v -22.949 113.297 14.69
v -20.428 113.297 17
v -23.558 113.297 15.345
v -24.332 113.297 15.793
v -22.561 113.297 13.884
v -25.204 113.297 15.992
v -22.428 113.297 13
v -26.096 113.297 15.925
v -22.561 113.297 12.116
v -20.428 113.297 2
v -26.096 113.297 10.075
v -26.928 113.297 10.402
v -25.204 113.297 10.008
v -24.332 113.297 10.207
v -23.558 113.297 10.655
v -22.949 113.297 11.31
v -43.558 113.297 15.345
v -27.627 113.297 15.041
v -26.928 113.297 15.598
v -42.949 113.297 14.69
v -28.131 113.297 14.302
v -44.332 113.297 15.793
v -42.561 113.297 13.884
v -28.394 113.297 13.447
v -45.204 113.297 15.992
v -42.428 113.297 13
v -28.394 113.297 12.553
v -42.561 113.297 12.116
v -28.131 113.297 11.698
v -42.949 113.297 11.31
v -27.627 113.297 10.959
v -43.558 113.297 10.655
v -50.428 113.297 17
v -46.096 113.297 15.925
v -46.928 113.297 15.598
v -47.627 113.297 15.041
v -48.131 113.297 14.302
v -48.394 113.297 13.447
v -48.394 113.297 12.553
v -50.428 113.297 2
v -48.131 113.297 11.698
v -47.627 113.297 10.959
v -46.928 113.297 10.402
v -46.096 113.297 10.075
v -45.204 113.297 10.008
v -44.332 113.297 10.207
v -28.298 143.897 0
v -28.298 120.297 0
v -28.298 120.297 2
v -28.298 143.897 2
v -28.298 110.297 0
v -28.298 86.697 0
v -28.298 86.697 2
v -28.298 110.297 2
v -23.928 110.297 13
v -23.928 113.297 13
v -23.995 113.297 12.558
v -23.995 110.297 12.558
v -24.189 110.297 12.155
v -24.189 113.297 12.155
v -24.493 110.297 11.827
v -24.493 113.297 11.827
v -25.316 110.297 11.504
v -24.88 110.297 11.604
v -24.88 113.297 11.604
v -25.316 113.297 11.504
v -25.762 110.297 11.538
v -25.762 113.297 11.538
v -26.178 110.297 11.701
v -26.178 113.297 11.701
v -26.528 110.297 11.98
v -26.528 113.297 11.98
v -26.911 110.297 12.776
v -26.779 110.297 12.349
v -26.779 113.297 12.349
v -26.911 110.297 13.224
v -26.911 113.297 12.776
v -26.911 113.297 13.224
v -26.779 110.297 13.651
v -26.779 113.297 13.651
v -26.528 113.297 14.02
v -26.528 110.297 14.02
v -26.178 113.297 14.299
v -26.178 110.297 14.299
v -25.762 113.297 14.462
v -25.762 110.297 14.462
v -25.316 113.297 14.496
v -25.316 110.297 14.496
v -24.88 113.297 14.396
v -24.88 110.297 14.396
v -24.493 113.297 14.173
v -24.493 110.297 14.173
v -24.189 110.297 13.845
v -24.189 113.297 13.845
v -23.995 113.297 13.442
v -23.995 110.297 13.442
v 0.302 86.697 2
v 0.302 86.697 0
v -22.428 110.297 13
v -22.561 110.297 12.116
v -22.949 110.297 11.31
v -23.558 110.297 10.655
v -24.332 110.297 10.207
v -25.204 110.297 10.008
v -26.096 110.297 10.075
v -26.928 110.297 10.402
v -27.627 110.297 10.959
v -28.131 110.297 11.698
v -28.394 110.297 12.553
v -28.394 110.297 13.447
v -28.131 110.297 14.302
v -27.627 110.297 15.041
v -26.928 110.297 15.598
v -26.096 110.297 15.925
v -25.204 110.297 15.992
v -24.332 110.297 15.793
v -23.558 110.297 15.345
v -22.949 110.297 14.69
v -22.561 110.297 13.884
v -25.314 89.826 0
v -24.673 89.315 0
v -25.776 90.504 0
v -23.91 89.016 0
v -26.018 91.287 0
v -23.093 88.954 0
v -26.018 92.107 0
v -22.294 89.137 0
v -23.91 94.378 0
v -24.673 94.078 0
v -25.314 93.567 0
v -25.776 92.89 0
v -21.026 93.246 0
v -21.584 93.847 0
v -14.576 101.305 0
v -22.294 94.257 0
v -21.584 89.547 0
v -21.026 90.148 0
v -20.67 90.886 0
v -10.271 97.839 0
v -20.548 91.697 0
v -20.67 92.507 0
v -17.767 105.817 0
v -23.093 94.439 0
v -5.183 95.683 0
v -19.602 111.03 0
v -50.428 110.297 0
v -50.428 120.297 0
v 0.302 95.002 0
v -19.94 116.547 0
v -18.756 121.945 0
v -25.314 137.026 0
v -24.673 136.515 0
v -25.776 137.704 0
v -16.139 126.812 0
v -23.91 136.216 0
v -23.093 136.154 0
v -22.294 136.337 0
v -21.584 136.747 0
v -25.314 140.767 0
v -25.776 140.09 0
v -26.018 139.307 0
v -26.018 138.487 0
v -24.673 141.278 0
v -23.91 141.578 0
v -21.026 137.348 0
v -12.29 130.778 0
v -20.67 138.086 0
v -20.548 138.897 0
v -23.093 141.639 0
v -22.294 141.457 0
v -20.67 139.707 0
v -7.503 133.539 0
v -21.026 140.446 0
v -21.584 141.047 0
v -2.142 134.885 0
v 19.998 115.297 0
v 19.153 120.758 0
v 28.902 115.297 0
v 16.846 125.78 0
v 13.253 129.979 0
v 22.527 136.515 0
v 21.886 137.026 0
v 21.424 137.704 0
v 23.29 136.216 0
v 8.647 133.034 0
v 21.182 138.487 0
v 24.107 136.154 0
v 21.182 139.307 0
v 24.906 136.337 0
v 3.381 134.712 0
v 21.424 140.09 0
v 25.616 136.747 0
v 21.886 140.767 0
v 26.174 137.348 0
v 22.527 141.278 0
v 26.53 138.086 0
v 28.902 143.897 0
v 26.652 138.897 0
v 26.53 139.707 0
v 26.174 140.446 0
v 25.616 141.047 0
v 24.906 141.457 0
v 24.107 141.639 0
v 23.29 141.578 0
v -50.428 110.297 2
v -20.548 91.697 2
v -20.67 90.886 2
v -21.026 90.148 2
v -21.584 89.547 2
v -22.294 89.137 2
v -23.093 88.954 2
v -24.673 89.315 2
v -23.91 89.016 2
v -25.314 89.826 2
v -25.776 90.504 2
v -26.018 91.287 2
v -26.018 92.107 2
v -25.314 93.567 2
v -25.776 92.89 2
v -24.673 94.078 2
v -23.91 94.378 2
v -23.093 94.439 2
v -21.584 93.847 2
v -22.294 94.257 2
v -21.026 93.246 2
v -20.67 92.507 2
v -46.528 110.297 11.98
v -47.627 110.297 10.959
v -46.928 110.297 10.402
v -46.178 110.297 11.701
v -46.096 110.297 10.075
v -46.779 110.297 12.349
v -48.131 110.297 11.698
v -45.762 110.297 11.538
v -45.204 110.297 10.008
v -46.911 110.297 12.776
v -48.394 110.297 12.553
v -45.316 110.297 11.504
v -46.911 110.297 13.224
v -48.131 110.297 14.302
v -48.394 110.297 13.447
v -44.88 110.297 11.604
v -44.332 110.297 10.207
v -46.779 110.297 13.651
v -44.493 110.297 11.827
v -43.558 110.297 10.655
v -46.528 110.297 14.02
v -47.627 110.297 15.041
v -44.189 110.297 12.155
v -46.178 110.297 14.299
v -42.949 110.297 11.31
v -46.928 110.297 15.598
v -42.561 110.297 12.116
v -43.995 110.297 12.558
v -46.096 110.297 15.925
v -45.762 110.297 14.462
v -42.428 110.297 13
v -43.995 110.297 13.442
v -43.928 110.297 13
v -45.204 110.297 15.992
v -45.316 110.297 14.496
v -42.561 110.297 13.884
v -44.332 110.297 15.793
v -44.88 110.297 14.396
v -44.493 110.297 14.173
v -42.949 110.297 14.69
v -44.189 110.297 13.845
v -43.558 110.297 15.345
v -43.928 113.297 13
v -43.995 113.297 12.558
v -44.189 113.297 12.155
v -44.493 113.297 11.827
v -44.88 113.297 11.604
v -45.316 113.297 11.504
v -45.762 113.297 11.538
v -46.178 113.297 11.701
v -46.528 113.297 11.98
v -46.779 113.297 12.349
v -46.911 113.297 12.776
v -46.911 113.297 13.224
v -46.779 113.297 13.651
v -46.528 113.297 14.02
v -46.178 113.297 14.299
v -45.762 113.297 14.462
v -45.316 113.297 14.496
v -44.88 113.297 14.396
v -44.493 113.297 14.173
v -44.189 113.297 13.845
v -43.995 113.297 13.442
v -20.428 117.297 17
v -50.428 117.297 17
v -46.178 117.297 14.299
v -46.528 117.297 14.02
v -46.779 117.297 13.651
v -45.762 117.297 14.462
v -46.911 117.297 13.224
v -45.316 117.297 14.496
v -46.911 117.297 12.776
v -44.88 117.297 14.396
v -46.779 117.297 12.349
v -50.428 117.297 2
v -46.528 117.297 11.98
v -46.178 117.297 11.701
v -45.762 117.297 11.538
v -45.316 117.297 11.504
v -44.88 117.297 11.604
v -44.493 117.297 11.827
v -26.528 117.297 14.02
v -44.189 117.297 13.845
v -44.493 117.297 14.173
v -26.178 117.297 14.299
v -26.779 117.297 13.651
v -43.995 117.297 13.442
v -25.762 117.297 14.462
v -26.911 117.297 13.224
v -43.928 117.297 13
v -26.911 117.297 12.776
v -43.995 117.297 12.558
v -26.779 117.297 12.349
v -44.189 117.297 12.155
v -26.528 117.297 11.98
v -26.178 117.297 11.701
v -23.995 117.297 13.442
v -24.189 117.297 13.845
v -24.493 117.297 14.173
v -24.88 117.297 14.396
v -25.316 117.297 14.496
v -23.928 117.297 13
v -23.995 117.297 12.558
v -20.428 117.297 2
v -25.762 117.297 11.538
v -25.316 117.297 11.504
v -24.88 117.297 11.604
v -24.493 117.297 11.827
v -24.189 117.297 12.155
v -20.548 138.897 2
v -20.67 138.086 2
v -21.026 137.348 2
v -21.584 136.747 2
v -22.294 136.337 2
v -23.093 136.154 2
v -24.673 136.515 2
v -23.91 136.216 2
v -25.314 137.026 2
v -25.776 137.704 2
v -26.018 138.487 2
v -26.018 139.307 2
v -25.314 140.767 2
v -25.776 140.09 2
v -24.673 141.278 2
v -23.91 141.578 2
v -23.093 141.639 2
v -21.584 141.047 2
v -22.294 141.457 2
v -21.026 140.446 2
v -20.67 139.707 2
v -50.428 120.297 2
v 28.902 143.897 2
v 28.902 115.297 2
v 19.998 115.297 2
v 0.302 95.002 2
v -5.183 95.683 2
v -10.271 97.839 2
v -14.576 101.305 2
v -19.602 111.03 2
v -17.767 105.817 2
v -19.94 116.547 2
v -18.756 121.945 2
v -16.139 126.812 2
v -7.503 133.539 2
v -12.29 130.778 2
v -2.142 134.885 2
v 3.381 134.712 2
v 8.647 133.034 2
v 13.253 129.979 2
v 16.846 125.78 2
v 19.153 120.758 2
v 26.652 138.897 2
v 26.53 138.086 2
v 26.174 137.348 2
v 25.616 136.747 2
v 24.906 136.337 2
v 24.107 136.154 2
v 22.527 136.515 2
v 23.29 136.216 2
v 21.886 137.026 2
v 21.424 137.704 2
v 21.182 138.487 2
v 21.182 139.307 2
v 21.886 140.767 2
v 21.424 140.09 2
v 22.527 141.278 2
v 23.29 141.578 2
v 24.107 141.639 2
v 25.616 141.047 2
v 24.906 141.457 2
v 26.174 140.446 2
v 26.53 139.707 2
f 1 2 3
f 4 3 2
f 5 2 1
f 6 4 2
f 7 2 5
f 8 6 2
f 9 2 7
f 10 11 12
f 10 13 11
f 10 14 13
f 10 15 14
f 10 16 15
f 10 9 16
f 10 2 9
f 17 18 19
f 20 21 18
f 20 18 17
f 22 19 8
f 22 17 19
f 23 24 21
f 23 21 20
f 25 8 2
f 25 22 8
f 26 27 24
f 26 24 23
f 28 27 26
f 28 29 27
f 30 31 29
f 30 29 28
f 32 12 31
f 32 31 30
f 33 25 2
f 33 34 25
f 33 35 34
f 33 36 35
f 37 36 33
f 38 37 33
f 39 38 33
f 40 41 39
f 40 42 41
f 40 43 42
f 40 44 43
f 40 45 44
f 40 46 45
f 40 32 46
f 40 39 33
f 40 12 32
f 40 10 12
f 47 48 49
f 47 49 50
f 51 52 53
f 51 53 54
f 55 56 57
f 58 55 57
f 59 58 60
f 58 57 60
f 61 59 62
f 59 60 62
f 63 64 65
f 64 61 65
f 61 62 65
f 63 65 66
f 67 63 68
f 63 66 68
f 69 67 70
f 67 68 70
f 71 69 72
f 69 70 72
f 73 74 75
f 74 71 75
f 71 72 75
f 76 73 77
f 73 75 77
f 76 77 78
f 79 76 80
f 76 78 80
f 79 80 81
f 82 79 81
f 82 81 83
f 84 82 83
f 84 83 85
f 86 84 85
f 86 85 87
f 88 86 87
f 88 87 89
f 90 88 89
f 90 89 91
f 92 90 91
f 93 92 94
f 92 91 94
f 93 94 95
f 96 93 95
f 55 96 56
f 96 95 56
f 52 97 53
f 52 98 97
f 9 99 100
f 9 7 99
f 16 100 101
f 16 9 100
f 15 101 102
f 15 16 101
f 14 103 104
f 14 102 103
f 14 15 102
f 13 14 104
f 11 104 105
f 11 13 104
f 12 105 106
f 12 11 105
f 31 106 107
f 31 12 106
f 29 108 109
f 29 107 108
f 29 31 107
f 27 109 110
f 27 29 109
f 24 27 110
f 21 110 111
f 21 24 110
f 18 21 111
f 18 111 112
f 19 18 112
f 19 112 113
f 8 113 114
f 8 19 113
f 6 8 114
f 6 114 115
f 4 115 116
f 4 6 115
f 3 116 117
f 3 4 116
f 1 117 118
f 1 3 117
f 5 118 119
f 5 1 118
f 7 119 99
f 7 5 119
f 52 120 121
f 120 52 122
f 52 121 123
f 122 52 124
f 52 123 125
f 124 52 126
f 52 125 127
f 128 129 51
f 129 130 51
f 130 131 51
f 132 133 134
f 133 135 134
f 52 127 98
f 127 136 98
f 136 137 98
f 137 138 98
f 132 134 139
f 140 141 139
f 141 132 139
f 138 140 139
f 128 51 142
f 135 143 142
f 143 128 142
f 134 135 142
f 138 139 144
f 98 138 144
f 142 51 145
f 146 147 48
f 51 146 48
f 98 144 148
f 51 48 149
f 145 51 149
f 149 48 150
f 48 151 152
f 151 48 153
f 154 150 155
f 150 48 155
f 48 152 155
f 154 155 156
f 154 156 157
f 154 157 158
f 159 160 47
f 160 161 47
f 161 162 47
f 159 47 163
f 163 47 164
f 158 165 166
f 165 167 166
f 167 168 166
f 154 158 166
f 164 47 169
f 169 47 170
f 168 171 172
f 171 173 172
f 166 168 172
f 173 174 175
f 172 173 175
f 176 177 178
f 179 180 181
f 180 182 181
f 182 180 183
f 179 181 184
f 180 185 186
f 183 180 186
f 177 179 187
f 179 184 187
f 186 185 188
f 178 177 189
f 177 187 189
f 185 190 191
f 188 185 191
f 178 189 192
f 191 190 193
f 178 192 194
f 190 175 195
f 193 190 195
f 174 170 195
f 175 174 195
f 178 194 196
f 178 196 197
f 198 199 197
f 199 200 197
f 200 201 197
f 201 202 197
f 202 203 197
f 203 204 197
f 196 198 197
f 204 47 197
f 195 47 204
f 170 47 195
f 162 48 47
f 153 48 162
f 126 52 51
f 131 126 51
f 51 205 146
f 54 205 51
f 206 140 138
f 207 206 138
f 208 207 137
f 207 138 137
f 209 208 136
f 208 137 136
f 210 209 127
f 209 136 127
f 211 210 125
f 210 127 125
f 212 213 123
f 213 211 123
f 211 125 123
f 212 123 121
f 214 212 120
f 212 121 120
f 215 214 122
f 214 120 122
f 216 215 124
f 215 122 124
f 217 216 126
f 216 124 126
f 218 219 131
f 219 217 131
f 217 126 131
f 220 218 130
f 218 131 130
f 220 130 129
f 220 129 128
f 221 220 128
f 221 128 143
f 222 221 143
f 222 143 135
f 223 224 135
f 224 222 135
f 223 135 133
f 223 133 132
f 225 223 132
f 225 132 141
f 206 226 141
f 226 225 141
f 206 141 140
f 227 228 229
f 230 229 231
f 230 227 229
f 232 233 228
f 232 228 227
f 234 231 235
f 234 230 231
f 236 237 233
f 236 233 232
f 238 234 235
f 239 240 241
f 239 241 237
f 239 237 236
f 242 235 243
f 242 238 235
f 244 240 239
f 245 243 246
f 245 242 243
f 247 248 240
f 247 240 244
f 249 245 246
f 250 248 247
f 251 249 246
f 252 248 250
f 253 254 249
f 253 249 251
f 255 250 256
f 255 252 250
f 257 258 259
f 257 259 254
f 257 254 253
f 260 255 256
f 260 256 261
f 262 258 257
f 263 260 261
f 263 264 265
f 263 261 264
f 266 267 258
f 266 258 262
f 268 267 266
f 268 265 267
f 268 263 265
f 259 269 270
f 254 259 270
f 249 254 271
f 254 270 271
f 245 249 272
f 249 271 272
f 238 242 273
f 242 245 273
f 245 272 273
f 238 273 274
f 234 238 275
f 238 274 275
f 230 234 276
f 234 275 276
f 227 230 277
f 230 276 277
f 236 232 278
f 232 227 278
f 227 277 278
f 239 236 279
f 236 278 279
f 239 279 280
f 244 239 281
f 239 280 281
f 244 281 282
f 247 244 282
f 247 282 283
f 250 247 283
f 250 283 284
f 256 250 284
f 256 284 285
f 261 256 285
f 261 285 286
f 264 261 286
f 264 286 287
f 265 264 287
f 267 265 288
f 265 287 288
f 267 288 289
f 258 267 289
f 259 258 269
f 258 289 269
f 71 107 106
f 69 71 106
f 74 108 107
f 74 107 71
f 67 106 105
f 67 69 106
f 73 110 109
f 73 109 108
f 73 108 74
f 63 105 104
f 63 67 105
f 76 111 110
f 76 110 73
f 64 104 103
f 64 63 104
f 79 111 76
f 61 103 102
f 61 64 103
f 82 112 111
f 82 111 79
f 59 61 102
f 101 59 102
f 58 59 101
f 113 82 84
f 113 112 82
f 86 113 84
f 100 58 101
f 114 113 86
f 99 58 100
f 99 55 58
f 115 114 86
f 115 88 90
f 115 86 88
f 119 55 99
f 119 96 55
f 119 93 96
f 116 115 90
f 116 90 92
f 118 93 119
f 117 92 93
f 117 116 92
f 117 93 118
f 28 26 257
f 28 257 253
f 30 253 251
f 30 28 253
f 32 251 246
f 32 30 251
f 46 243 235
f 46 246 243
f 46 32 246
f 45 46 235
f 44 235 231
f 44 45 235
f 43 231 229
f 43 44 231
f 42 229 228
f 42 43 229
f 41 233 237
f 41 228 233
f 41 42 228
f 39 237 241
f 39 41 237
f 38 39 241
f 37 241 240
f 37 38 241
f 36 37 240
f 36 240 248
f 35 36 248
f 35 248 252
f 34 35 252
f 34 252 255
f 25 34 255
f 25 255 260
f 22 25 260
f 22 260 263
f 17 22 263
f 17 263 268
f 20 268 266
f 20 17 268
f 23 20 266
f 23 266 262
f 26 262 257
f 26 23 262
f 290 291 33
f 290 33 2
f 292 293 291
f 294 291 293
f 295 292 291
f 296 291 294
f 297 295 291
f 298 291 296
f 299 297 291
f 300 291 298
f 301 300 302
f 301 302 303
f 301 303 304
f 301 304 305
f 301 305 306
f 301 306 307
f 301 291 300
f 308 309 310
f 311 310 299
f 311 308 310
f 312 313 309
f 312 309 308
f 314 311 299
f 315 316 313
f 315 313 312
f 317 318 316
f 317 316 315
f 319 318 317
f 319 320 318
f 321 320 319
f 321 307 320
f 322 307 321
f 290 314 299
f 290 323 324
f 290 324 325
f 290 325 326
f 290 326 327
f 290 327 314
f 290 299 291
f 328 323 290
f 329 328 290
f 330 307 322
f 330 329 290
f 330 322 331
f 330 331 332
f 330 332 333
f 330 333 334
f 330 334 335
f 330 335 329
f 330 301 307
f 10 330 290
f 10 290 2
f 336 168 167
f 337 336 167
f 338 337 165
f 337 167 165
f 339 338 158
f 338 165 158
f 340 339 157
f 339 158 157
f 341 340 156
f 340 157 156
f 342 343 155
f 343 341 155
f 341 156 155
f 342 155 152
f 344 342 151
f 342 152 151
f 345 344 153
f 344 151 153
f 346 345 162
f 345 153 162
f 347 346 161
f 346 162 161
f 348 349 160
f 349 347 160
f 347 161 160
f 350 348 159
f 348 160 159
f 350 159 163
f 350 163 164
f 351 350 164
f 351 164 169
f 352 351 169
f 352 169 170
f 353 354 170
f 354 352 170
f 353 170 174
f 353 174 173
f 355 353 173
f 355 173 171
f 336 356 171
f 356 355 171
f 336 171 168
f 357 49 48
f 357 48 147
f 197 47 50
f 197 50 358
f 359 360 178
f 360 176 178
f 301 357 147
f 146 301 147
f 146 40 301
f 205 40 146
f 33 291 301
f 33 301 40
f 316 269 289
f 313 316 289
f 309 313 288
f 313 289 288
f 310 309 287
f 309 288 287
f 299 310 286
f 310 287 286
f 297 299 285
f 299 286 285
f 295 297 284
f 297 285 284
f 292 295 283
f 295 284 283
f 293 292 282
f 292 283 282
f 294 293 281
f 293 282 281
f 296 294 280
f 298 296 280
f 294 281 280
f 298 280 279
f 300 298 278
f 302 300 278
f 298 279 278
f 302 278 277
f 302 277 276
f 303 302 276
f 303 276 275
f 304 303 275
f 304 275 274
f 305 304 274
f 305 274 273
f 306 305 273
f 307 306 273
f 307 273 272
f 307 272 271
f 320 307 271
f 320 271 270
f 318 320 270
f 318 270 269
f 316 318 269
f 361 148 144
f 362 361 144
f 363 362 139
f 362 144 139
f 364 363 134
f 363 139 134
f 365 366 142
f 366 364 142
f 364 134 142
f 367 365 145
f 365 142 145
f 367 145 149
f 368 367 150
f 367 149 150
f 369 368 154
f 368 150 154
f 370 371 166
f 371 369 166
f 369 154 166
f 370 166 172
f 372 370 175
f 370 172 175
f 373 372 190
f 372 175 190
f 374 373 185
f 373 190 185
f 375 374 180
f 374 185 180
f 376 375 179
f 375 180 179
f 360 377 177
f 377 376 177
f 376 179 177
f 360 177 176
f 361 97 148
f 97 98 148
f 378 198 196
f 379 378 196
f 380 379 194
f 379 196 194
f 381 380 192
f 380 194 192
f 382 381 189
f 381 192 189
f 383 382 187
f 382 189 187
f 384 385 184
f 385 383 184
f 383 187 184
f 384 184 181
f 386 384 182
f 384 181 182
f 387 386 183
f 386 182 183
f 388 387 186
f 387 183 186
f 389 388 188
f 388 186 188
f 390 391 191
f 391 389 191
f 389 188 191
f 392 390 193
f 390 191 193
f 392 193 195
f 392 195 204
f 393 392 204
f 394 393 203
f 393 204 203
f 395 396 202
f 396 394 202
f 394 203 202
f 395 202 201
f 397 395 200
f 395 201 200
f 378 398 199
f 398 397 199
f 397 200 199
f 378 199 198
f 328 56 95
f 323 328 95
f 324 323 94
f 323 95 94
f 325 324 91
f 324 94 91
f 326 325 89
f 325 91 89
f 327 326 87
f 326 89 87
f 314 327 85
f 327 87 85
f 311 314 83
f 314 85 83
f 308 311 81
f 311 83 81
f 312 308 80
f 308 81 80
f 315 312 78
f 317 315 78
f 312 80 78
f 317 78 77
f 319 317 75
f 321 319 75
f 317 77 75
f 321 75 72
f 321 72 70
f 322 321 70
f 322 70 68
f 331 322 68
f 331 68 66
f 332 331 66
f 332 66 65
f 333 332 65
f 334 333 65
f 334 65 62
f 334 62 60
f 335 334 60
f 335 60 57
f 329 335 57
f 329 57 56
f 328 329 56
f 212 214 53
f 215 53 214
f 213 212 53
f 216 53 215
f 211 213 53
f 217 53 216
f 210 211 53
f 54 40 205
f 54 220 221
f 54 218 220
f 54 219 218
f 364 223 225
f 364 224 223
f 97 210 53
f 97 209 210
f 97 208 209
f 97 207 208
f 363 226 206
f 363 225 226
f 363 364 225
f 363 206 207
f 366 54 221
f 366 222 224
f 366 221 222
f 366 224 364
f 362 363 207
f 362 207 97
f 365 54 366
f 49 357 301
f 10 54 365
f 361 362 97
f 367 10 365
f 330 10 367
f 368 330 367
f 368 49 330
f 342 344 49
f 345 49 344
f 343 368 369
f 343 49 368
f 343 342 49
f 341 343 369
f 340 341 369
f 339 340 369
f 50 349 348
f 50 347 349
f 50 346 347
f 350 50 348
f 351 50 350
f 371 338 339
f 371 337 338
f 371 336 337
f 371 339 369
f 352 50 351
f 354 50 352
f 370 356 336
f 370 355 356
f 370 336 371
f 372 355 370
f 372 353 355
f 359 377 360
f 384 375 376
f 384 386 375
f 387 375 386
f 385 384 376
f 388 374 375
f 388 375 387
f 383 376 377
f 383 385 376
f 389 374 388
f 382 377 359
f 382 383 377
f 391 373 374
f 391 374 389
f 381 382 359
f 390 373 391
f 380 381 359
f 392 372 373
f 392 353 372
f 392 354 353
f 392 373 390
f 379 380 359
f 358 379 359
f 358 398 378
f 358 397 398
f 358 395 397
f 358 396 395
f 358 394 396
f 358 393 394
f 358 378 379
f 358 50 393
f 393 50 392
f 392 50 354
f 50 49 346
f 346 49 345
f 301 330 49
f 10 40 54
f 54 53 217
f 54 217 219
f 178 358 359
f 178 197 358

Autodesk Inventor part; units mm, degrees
ref_plane "YZ Plane" through (0, 0, 0) normal (1, 0, 0) x (0, 1, 0)
ref_plane "XZ Plane" through (0, 0, 0) normal (0, 1, 0) x (-1, 0, 0)
ref_plane "XY Plane" through (0, 0, 0) normal (0, 0, 1) x (1, 0, 0)
sketch "Sketch1" plane through (0, 0, 0) normal (0, 0, 1) x (1, 0, 0)
  line L0 (30.9017, 120.8967) -> (30.9017, 145.8967)
  line L1 (30.9017, 145.8967) -> (-30.2983, 145.8967)
  line L2 (-30.2983, 145.8967) -> (-30.2983, 120.8967)
  line L3 (-30.2983, 120.8967) -> (-33.2983, 120.8967)
  line L4 (-33.2983, 120.8967) -> (-33.2983, 89.6967)
  line L5 (-33.2983, 89.6967) -> (-25.2983, 81.6967)
  line L6 (-25.2983, 81.6967) -> (25.9017, 81.6967)
  line L7 (25.9017, 81.6967) -> (33.9017, 89.6967)
  line L8 (33.9017, 89.6967) -> (33.9017, 120.8967)
  line L9 (33.9017, 120.8967) -> (30.9017, 120.8967)
  circle A0 centre (0, 115) radius 20
  circle A1 centre (-23.2983, 138.8967) radius 2.75
  circle A2 centre (23.9017, 91.6967) radius 2.75
  circle A3 centre (23.9017, 138.8967) radius 2.75
  circle A4 centre (-23.2983, 91.6967) radius 2.75
  line L10 (-30.2983, 145.8967) -> (-30.2983, 143.8967)
  line L11 (-30.2983, 143.8967) -> (-28.2983, 143.8967)
  line L12 (-28.2983, 143.8967) -> (28.9017, 143.8967)
  line L13 (28.9017, 143.8967) -> (28.9017, 86.6967)
  line L14 (28.9017, 86.6967) -> (-28.2983, 86.6967)
  line L15 (-28.2983, 86.6967) -> (-28.2983, 143.8967)
  line L16 (0.3017, 86.6967) -> (0.3017, 95.0023)
  line L17 (19.9978, 115.2967) -> (28.9017, 115.2967)
  point P0 (0, 0)
  dimension "d0" = 2
  dimension "d1" = 57.2
extrude "Extrusion1" add sketch "Sketch1" along normal blind 2 contours L12 L13 L17 A0 L16 L14 L15
sketch "Sketch6" plane through (0, 0, 2) normal (0, 0, 1) x (1, 0, 0)
  line L0 (-36.1687, 110.2967) -> (-20.428, 110.2967)
  line L1 (-20.428, 110.2967) -> (-20.428, 120.2967)
  line L2 (-20.428, 120.2967) -> (-36.1687, 120.2967)
  line L3 (-36.1687, 120.2967) -> (-36.1687, 110.2967)
  line L4 (-28.2983, 143.8967) -> (-28.2983, 86.6967) projected
  line L5 (-36.1687, 110.2967) -> (-20.428, 120.2967) construction
  line L6 (-20.428, 110.2967) -> (-36.1687, 120.2967) construction
  line L7 (-20.428, 120.2967) -> (-50.428, 120.2967)
  line L8 (-50.428, 120.2967) -> (-50.428, 110.2967)
  line L9 (-50.428, 110.2967) -> (-20.428, 110.2967)
  point P0 (0, 0)
  point P1 (-28.2983, 115.2967)
  dimension "d14" = 10
  dimension "d17" = 30
extrude "Extrusion5" add sketch "Sketch6" against normal blind 2
sketch "Sketch7" plane through (0, 0, 2) normal (0, 0, 1) x (1, 0, 0)
  line L0 (-50.428, 110.2967) -> (-50.428, 120.2967) projected
  line L1 (-50.428, 115.2967) -> (-50.428, 117.2967)
  line L2 (-50.428, 117.2967) -> (-20.428, 117.2967)
  line L3 (-20.428, 117.2967) -> (-20.428, 113.2967)
  line L4 (-20.428, 113.2967) -> (-50.428, 113.2967)
  line L5 (-50.428, 113.2967) -> (-50.428, 115.2967)
  point P0 (0, 0)
  dimension "d18" = 2
  dimension "d19" = 30
  dimension "d20" = 4
extrude "Extrusion6" add sketch "Sketch7" along normal blind 15
sketch "Sketch8" plane through (-50.428, 113.2967, 2) normal (0, -1, 0) x (1, 0, 0)
  circle A0 centre (25, 11) radius 3
  circle A1 centre (5, 11) radius 3
  line L0 (30, 15) -> (30, 7)
  line L1 (30, 15) -> (0, 15)
  line L2 (0, 7) -> (0, 15)
  line L3 (30, 7) -> (0, 7)
  circle A2 centre (25, 11) radius 3
  circle A3 centre (25, 11) radius 1.5
  circle A4 centre (5, 11) radius 1.5
  circle A5 centre (5, 11) radius 3
  circle A6 centre (5, 11) radius 1.5
  point P0 (50.428, -2)
extrude "Extrusion7" add sketch "Sketch8" along normal blind 3 contours A0 | A1
sketch "Sketch9" plane through (-50.428, 113.2967, 2) normal (0, -1, 0) x (1, 0, 0)
  circle A0 centre (25, 11) radius 1.5 projected
  circle A1 centre (5, 11) radius 1.5 projected
  point P0 (50.428, -2)
extrude "Extrusion8" cut sketch "Sketch9" against normal through all
properties part number "stop_rotador_2"
